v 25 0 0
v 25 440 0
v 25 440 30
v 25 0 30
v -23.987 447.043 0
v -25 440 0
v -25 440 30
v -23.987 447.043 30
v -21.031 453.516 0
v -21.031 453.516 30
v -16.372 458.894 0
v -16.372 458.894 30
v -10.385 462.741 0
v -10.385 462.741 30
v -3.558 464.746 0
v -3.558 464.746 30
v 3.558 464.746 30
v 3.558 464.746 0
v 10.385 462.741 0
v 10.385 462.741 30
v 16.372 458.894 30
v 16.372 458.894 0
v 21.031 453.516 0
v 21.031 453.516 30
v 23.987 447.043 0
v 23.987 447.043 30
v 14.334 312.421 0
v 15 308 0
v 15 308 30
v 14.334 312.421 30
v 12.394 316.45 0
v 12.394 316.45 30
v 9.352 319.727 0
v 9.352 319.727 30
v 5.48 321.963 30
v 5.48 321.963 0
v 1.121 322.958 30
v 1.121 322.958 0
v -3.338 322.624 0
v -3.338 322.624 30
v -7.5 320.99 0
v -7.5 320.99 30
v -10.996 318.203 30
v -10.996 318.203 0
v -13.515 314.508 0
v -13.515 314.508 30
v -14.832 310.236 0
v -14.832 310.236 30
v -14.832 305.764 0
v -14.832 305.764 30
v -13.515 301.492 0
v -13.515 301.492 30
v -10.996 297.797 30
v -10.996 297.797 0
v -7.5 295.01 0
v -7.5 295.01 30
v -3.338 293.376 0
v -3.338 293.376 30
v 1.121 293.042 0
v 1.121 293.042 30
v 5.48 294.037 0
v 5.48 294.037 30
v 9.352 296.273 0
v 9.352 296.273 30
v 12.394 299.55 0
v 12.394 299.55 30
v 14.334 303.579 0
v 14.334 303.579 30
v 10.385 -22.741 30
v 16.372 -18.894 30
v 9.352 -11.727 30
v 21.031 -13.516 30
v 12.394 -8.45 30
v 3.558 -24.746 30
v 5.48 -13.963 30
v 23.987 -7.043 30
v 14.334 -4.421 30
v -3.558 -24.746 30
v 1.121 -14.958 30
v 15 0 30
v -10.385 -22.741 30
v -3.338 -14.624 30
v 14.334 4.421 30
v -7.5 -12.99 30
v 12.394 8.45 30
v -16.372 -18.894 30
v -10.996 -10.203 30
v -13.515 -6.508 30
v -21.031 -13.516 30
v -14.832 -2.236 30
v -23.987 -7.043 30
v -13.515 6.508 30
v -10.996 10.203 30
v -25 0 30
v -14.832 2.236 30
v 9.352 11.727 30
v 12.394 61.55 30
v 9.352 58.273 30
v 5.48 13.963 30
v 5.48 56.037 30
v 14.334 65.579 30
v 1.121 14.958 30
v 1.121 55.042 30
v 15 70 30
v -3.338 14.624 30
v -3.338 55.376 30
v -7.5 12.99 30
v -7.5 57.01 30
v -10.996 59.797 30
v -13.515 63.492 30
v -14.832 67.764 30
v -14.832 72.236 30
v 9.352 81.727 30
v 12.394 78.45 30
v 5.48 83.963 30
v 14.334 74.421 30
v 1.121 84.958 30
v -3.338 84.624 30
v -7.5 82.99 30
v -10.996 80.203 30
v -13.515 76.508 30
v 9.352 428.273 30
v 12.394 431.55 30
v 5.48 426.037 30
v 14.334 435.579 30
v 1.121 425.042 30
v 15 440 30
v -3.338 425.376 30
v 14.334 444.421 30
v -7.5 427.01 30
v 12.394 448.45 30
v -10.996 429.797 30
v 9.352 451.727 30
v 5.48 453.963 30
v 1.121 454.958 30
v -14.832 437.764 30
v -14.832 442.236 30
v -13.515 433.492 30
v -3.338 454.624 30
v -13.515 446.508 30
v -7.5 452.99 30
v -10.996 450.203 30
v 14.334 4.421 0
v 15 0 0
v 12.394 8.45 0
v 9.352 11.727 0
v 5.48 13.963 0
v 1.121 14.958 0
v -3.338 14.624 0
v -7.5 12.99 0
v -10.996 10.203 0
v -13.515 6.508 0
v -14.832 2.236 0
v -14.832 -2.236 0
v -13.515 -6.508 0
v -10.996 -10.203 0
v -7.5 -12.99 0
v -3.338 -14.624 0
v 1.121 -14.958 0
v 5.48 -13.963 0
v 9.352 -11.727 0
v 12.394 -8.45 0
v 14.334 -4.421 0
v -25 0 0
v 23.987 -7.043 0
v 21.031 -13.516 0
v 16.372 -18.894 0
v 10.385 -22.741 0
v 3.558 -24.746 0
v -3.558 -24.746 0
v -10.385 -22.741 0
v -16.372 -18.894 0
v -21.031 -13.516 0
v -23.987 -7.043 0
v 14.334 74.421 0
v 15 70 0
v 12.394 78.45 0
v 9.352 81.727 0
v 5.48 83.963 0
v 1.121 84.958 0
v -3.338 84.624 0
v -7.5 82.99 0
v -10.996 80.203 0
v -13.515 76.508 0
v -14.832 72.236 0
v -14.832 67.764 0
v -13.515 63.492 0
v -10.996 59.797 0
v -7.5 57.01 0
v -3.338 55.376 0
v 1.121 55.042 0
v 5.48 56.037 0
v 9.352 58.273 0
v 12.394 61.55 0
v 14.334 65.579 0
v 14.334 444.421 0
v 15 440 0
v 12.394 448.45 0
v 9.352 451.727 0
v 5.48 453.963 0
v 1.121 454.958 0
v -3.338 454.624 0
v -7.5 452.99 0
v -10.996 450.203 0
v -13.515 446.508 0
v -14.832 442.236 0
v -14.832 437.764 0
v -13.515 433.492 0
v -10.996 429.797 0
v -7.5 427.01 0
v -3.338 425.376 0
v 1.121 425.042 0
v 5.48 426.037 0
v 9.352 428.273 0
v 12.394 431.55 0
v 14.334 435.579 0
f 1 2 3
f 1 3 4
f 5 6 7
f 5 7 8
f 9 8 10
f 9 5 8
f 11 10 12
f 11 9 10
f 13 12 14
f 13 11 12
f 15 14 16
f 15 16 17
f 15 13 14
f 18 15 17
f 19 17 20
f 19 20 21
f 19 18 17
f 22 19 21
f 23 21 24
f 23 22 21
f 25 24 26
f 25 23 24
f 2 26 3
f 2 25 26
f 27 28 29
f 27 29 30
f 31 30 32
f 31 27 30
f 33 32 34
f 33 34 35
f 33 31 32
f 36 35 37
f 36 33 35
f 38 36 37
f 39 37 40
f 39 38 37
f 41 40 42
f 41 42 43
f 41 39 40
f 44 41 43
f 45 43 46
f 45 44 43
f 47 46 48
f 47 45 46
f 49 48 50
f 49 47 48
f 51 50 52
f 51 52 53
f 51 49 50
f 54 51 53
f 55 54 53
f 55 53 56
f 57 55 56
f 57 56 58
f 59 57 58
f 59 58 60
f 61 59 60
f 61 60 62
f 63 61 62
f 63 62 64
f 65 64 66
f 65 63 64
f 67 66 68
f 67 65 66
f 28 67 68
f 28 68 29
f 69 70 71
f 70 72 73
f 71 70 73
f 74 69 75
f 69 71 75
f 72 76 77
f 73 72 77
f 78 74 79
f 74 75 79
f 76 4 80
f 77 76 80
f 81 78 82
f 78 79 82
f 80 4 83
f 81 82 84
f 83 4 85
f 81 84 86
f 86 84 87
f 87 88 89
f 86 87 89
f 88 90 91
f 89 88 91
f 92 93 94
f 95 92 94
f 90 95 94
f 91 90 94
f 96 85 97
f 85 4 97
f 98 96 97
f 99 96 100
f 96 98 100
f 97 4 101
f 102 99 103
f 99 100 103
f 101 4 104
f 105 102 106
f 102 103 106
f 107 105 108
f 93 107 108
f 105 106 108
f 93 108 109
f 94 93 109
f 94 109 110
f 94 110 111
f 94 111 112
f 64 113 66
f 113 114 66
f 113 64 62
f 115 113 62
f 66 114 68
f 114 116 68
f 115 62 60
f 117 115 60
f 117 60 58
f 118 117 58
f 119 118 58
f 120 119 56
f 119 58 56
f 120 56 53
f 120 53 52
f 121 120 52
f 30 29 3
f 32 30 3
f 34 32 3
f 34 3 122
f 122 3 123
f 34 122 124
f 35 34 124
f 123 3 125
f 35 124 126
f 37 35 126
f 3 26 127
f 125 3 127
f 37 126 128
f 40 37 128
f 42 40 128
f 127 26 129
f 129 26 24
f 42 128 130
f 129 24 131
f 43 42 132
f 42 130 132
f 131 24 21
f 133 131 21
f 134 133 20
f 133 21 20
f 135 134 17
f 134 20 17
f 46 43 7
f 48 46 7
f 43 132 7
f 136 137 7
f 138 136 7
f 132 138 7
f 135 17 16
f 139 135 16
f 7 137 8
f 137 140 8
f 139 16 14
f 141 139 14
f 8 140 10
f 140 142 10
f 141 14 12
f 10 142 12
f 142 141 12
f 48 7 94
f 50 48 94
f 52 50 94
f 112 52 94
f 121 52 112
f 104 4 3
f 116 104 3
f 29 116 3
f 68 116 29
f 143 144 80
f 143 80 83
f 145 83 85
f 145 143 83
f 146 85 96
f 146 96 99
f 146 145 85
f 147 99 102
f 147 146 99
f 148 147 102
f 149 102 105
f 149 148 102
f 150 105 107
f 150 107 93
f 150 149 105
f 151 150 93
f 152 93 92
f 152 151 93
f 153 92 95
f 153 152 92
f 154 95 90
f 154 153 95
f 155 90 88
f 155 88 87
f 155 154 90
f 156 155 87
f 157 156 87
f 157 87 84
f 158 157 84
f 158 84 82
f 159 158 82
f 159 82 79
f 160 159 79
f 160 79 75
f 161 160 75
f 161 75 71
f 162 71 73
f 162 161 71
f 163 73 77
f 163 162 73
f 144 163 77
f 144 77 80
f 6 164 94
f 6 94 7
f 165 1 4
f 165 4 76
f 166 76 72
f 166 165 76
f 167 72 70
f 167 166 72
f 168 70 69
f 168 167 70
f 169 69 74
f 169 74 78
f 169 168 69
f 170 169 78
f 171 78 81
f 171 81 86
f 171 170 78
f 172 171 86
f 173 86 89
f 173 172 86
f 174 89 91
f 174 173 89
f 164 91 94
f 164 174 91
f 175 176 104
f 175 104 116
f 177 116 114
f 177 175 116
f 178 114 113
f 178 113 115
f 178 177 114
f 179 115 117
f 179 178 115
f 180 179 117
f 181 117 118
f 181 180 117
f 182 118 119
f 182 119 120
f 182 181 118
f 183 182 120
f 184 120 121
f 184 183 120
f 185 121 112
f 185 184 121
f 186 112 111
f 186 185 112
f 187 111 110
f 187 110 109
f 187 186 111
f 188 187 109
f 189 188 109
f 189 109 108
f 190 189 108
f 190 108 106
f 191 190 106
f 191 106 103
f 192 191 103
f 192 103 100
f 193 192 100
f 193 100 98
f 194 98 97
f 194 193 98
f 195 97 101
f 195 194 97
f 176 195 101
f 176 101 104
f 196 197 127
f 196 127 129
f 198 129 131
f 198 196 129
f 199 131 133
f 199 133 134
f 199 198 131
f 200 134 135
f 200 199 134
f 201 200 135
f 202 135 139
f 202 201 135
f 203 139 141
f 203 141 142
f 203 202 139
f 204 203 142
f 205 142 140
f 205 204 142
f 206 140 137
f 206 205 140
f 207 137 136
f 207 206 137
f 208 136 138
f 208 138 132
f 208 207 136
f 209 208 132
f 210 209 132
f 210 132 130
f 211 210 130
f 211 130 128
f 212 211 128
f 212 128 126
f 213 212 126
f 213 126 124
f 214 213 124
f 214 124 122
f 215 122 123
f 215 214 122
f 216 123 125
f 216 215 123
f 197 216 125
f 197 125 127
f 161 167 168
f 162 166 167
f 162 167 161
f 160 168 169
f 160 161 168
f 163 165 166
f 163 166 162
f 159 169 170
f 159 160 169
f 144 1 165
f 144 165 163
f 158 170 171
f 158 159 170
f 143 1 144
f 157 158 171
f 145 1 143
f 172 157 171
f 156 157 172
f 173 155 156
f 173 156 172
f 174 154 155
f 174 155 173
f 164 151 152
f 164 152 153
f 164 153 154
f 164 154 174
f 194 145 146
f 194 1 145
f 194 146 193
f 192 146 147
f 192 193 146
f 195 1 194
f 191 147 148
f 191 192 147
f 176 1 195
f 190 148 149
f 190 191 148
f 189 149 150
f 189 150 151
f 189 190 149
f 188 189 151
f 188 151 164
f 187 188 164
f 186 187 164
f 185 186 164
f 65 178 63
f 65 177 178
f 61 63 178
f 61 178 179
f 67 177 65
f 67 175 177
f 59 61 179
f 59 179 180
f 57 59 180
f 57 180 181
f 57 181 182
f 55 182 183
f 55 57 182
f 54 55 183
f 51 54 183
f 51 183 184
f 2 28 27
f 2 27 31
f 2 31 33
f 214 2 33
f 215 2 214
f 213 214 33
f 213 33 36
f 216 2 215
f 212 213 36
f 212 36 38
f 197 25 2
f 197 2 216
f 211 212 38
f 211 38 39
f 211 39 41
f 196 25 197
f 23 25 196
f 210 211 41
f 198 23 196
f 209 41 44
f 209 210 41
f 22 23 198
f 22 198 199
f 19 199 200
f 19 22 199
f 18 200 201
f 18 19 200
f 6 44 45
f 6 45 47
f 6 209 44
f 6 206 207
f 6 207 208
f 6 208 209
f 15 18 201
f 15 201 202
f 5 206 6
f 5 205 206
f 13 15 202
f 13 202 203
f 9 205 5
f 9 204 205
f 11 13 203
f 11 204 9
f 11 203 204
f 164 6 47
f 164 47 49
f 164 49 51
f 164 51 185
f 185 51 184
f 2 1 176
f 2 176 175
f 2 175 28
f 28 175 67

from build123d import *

# Parameters (mm, degrees)
SKETCH1_R           = 15
BOSS_EXTRUDE1_DEPTH = 30


with BuildPart() as part:
    # Sketch1 → Boss-Extrude1 (new body)
    with BuildSketch(Plane.XY):
        with BuildLine():
            Line((-25, 0), (-25, 440))
            ThreePointArc((-25, 440), (0, 465), (25, 440))
            Line((25, 440), (25, 0))
            ThreePointArc((25, 0), (0, -25), (-25, 0))
        make_face()
        with Locations((0, 440)):
            Circle(SKETCH1_R, mode=Mode.SUBTRACT)
        with Locations((0, 308)):
            Circle(SKETCH1_R, mode=Mode.SUBTRACT)
        with Locations((0, 70)):
            Circle(SKETCH1_R, mode=Mode.SUBTRACT)
        Circle(SKETCH1_R, mode=Mode.SUBTRACT)
    extrude(amount=BOSS_EXTRUDE1_DEPTH)


solid = part.part
